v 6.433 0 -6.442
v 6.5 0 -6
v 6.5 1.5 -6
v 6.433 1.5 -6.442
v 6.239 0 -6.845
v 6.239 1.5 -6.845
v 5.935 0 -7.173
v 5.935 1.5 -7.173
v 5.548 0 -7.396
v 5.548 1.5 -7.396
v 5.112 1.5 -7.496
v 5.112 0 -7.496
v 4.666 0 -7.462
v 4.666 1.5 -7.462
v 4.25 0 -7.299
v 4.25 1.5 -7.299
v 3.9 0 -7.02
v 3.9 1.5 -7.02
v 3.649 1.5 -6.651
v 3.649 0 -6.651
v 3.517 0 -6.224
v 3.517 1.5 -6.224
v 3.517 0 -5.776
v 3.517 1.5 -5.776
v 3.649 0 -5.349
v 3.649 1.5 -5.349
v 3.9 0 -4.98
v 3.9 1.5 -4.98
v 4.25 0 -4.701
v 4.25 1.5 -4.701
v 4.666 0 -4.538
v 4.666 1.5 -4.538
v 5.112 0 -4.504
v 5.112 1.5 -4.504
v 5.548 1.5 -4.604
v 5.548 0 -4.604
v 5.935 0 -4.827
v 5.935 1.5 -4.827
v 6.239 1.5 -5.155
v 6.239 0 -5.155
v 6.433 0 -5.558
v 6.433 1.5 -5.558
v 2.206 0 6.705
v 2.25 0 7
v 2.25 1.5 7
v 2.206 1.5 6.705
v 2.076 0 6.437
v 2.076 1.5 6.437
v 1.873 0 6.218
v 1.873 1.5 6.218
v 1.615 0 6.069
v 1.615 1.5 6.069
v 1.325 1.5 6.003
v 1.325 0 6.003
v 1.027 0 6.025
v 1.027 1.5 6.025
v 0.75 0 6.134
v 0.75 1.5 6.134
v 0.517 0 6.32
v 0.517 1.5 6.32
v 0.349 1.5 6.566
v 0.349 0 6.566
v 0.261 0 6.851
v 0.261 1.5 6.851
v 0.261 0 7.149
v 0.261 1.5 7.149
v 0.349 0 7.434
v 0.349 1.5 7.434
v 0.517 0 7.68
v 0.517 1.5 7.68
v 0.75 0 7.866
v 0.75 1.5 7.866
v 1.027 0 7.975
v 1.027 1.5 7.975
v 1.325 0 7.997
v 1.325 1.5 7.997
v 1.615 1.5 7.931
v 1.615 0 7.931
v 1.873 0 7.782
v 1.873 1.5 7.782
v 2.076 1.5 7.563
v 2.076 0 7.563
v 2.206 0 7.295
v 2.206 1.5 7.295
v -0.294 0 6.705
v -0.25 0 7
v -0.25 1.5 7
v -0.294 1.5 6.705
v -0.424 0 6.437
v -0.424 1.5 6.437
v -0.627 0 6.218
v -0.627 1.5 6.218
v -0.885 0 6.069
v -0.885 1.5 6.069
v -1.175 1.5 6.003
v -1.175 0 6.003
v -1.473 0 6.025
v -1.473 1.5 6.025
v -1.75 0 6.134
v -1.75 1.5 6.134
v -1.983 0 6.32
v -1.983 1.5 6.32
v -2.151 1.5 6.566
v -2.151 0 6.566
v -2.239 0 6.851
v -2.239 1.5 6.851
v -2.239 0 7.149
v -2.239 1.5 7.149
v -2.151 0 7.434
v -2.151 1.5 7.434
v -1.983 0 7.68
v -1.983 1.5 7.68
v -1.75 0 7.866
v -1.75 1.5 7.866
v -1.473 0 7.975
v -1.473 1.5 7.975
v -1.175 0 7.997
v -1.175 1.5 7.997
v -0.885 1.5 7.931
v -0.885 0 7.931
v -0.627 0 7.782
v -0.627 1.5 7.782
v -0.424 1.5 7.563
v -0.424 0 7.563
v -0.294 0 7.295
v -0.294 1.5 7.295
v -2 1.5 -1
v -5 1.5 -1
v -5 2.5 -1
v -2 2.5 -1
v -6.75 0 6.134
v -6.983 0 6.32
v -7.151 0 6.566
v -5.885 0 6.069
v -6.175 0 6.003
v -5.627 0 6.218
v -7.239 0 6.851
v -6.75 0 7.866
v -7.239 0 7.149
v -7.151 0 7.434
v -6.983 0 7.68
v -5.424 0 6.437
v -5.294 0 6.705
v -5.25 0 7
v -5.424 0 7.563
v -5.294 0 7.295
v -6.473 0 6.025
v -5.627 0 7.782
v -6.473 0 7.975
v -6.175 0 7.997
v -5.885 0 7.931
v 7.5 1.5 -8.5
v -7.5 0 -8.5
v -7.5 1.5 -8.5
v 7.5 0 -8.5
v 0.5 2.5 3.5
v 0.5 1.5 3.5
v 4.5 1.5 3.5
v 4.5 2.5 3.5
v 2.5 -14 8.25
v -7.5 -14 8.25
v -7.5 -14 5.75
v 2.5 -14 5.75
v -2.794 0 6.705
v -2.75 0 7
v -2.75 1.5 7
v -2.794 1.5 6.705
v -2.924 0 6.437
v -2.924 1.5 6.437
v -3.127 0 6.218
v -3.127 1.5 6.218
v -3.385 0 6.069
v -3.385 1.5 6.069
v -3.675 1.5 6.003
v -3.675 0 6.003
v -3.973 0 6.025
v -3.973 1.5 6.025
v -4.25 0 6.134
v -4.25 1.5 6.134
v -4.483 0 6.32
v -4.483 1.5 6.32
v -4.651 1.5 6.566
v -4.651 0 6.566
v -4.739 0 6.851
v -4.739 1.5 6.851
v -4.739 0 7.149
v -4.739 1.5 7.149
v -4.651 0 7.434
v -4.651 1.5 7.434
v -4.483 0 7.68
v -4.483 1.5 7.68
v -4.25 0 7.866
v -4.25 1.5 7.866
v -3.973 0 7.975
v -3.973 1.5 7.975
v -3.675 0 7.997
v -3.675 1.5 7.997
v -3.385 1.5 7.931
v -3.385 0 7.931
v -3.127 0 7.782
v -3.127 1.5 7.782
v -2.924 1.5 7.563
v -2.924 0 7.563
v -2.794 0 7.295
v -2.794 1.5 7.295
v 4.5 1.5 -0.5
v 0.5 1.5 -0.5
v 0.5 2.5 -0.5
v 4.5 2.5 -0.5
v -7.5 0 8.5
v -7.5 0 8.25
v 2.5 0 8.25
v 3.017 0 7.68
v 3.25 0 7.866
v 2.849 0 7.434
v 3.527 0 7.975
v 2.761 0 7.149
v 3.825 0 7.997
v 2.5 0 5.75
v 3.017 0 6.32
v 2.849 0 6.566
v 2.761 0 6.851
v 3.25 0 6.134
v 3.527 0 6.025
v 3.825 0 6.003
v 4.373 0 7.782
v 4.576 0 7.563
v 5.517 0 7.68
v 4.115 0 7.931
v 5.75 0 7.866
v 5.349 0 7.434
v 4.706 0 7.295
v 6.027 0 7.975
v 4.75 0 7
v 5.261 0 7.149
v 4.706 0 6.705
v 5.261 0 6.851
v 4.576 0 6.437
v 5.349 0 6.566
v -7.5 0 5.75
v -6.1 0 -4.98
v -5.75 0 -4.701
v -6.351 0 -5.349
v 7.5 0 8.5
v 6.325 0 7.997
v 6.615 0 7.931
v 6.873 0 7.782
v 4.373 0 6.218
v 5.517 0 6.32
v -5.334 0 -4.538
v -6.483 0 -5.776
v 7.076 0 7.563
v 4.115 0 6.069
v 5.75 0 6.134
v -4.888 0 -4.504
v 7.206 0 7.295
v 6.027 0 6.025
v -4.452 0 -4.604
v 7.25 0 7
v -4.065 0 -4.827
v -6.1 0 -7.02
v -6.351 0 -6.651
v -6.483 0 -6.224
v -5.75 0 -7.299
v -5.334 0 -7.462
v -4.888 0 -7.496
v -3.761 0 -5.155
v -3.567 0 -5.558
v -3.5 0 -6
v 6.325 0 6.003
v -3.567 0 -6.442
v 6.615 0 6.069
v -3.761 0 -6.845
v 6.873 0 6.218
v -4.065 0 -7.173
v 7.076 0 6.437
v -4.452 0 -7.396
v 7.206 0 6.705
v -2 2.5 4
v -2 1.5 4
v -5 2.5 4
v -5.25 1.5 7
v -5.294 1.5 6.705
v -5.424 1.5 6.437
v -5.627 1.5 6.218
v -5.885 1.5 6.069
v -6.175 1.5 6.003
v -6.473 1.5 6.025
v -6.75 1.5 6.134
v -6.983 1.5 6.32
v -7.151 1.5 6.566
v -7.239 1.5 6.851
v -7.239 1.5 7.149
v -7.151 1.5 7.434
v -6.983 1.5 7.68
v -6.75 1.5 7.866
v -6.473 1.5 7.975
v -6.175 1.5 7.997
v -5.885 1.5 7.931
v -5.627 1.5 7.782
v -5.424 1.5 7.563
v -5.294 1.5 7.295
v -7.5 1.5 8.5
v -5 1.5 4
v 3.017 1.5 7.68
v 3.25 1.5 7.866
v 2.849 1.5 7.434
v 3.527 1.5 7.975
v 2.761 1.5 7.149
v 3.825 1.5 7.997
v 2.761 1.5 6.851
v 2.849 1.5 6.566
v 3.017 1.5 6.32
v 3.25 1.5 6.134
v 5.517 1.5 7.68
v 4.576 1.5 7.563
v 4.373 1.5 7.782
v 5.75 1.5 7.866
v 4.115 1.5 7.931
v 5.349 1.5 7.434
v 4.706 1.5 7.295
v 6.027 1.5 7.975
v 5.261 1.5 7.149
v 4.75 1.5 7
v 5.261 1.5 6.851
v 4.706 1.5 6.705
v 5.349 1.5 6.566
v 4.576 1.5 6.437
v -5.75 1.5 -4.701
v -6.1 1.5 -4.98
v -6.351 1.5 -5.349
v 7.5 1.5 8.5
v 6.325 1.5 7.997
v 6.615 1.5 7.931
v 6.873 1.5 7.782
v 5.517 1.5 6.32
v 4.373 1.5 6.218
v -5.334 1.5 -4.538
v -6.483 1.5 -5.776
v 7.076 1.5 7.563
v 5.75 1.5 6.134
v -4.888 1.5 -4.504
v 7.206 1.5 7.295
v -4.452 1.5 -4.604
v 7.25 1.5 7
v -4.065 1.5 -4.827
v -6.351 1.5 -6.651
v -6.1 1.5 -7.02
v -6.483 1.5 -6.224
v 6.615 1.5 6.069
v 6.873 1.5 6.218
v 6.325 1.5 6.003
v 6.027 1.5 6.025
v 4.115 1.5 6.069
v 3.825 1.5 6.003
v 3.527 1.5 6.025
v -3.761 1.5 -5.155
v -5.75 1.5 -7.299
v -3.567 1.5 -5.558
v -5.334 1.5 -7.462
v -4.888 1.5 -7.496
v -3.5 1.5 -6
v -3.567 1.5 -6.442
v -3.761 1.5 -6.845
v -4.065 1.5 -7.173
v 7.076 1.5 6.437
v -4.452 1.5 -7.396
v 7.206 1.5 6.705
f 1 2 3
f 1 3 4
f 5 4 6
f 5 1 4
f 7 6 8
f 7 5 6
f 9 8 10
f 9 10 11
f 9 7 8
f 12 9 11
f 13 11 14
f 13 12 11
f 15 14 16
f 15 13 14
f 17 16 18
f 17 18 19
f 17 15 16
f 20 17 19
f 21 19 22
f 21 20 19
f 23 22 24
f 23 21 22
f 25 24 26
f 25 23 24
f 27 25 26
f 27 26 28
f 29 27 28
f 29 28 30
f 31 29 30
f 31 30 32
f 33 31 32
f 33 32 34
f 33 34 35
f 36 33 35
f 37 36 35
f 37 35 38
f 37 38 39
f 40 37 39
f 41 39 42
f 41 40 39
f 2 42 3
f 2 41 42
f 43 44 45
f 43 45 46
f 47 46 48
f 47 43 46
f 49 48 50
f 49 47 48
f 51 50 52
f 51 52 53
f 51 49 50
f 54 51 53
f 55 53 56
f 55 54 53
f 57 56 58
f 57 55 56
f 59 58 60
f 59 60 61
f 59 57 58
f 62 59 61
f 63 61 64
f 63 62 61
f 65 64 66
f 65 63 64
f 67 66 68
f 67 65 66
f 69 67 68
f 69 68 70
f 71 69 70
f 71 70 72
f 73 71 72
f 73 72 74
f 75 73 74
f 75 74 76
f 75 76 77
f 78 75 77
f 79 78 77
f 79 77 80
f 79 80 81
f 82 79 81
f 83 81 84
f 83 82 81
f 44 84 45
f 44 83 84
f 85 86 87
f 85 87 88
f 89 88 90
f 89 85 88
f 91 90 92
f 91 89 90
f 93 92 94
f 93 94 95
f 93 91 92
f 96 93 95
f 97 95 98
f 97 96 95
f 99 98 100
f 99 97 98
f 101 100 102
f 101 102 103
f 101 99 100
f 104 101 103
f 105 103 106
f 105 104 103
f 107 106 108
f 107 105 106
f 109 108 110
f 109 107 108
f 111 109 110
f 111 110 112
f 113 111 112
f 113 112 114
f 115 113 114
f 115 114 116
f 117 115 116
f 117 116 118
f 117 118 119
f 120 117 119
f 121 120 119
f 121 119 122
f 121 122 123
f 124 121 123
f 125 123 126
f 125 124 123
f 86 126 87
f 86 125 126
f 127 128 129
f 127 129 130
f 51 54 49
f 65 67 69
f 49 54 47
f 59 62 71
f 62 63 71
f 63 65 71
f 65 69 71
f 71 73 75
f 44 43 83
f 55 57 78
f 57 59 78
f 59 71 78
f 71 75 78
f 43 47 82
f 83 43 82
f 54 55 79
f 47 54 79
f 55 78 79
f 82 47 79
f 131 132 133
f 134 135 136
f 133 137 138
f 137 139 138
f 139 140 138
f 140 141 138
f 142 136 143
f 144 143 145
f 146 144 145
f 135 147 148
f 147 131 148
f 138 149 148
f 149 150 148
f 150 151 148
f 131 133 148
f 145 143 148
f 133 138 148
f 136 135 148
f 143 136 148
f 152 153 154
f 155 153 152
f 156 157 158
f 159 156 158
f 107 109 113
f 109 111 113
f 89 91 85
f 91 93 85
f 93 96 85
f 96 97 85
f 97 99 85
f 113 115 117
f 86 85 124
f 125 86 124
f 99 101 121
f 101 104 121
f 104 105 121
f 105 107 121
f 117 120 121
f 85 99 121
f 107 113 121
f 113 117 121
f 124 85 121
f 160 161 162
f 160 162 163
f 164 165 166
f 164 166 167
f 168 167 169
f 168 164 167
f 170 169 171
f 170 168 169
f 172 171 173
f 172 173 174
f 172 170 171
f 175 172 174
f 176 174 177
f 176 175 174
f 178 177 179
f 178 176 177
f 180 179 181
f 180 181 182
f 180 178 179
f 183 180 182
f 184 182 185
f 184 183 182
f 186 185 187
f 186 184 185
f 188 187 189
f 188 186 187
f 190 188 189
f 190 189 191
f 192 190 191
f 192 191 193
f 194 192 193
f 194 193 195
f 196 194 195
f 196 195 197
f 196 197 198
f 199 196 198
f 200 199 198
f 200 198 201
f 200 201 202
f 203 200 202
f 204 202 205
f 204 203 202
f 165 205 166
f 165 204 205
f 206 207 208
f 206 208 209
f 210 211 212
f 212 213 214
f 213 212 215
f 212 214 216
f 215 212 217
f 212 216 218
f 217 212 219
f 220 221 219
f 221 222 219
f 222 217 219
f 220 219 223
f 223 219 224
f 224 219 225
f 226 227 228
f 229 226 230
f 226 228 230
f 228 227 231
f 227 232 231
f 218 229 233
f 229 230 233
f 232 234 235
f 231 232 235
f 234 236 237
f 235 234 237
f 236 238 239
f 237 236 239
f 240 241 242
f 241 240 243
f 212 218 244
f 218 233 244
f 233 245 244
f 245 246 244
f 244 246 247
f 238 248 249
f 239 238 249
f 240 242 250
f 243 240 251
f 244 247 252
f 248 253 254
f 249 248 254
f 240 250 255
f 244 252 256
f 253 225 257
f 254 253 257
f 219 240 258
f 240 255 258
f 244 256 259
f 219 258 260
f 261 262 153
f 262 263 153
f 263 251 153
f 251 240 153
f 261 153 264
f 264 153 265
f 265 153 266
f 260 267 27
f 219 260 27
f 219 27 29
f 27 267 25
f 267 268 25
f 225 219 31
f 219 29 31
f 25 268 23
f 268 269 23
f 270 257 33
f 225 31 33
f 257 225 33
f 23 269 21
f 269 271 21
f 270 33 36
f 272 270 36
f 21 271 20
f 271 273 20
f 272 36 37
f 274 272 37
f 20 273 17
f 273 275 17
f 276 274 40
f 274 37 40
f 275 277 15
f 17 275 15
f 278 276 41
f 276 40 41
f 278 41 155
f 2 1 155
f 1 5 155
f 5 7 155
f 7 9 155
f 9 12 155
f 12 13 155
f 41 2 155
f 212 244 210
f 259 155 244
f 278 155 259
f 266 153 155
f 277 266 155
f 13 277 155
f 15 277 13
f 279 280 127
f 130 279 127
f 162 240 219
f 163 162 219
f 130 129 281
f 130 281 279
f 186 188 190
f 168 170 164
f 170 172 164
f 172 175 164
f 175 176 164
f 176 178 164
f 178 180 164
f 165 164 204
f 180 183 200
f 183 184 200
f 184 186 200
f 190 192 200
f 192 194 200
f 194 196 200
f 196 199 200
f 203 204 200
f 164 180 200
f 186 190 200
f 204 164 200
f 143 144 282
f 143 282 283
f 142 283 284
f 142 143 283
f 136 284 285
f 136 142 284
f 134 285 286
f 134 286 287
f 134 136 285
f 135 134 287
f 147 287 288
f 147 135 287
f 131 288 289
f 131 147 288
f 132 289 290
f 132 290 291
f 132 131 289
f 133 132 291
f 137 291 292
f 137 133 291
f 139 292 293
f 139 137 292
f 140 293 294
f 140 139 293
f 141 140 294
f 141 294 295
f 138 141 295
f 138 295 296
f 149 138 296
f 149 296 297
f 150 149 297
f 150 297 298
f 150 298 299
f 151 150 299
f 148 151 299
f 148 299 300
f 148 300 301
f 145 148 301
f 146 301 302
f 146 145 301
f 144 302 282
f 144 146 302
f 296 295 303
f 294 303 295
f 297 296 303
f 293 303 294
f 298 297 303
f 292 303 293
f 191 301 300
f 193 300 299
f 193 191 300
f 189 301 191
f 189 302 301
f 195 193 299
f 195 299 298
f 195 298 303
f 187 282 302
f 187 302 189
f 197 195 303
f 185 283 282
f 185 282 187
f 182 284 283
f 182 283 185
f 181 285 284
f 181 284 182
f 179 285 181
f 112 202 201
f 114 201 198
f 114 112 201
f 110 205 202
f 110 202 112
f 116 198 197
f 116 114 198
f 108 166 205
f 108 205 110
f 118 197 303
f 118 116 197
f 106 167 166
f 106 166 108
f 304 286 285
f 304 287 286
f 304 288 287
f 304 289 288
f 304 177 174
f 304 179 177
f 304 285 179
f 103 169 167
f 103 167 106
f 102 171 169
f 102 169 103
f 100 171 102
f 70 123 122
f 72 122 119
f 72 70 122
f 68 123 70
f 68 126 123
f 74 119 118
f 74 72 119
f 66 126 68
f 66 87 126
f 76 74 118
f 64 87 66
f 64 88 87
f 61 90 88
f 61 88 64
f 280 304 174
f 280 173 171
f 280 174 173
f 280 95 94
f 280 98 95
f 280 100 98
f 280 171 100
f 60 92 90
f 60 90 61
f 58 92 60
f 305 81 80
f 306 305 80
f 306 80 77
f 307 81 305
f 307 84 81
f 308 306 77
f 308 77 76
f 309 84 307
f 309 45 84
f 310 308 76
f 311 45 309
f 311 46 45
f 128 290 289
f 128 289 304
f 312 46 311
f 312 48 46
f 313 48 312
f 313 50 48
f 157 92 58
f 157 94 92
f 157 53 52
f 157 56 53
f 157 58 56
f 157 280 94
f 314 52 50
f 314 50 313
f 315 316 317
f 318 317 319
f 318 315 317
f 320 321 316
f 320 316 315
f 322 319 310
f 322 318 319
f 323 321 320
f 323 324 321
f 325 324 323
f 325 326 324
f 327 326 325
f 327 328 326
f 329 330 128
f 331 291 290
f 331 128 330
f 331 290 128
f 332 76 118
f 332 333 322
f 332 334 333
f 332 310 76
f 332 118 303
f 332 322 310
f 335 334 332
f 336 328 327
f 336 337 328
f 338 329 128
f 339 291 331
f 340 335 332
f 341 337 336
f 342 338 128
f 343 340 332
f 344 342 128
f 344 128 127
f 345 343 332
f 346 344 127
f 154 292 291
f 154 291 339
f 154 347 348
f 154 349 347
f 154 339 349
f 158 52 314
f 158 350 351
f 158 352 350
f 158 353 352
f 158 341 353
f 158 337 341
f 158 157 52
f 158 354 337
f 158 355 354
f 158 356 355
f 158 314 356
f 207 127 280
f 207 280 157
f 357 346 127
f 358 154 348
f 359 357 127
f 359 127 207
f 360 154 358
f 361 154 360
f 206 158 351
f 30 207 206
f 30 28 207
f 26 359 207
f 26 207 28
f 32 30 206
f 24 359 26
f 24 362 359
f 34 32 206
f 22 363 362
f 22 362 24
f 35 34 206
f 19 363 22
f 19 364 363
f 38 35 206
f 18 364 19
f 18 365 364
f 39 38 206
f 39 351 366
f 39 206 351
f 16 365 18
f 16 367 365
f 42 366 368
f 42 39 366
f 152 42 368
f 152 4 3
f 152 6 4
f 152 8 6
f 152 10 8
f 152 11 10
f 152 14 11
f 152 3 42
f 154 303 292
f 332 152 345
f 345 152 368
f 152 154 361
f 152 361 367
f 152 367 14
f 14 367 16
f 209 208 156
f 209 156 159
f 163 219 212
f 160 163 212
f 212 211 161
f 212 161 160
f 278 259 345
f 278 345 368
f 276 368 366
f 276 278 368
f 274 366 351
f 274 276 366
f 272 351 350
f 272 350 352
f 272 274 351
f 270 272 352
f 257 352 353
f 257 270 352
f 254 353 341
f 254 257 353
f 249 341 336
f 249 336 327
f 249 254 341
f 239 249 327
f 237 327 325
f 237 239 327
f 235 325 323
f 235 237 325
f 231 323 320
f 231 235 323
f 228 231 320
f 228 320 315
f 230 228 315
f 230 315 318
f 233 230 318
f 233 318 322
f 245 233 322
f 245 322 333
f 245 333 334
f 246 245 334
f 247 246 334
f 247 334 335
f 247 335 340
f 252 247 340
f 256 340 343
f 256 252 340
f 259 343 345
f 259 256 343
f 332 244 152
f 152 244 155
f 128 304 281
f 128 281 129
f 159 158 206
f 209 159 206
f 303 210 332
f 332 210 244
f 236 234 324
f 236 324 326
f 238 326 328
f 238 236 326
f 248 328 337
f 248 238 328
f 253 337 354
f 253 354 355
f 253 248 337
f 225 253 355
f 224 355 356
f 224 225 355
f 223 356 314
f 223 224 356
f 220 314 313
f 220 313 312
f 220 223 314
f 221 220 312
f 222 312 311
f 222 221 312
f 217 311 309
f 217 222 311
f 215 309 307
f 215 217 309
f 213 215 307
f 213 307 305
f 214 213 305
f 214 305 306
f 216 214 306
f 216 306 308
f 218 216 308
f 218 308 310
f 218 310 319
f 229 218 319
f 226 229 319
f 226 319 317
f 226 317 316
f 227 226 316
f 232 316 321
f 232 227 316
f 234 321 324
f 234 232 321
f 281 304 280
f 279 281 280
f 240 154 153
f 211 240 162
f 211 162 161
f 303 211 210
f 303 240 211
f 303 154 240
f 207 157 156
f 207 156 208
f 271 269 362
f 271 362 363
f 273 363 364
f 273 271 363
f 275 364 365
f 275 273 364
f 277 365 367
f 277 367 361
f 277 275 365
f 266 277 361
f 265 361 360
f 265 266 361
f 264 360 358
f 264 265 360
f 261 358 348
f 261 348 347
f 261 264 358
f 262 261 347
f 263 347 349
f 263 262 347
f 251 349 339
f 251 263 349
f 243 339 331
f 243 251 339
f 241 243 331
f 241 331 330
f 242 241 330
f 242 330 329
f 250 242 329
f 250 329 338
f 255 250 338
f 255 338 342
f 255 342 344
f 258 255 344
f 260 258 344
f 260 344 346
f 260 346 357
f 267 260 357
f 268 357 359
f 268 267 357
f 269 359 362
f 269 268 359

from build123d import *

# Parameters (mm, degrees)
ESQUISSE1_W        = 15
ESQUISSE1_H        = 17
ESQUISSE1_R        = 1.5
ESQUISSE1_R_2      = 1
BOSS_EXTRU_1_DEPTH = 1.5
ESQUISSE2_W        = 3
ESQUISSE2_H        = 5
ESQUISSE2_W_2      = 4
ESQUISSE2_H_2      = 4
BOSS_EXTRU_2_DEPTH = 1
ESQUISSE3_W        = 10
ESQUISSE3_H        = 2.5
BOSS_EXTRU_3_DEPTH = 14


with BuildPart() as part:
    # Esquisse1 → Boss.-Extru.1 (new body)
    with BuildSketch(Plane(origin=(0, 0, 0), x_dir=(1, 0, 0), z_dir=(0, 1, 0))):
        Rectangle(ESQUISSE1_W, ESQUISSE1_H)
        with Locations((-5, 6)):
            Circle(ESQUISSE1_R, mode=Mode.SUBTRACT)
        with Locations((5, 6)):
            Circle(ESQUISSE1_R, mode=Mode.SUBTRACT)
        with Locations((-6.25, -7)):
            Circle(ESQUISSE1_R_2, mode=Mode.SUBTRACT)
        with Locations((-3.75, -7)):
            Circle(ESQUISSE1_R_2, mode=Mode.SUBTRACT)
        with Locations((-1.25, -7)):
            Circle(ESQUISSE1_R_2, mode=Mode.SUBTRACT)
        with Locations((1.25, -7)):
            Circle(ESQUISSE1_R_2, mode=Mode.SUBTRACT)
        with Locations((3.75, -7)):
            Circle(ESQUISSE1_R_2, mode=Mode.SUBTRACT)
        with Locations((6.25, -7)):
            Circle(ESQUISSE1_R_2, mode=Mode.SUBTRACT)
    extrude(amount=BOSS_EXTRU_1_DEPTH)

    # Esquisse2 → Boss.-Extru.2 (add)
    with BuildSketch(Plane(origin=(0, 1.5, 0), x_dir=(1, 0, 0), z_dir=(0, 1, 0))):
        with Locations((-3.5, -1.5)):
            Rectangle(ESQUISSE2_W, ESQUISSE2_H)
        with Locations((2.5, -1.5)):
            Rectangle(ESQUISSE2_W_2, ESQUISSE2_H_2)
    extrude(amount=BOSS_EXTRU_2_DEPTH)

    # Esquisse3 → Boss.-Extru.3 (add)
    with BuildSketch(Plane.XZ):
        with Locations((-2.5, 7)):
            Rectangle(ESQUISSE3_W, ESQUISSE3_H)
    extrude(amount=BOSS_EXTRU_3_DEPTH)


solid = part.part
